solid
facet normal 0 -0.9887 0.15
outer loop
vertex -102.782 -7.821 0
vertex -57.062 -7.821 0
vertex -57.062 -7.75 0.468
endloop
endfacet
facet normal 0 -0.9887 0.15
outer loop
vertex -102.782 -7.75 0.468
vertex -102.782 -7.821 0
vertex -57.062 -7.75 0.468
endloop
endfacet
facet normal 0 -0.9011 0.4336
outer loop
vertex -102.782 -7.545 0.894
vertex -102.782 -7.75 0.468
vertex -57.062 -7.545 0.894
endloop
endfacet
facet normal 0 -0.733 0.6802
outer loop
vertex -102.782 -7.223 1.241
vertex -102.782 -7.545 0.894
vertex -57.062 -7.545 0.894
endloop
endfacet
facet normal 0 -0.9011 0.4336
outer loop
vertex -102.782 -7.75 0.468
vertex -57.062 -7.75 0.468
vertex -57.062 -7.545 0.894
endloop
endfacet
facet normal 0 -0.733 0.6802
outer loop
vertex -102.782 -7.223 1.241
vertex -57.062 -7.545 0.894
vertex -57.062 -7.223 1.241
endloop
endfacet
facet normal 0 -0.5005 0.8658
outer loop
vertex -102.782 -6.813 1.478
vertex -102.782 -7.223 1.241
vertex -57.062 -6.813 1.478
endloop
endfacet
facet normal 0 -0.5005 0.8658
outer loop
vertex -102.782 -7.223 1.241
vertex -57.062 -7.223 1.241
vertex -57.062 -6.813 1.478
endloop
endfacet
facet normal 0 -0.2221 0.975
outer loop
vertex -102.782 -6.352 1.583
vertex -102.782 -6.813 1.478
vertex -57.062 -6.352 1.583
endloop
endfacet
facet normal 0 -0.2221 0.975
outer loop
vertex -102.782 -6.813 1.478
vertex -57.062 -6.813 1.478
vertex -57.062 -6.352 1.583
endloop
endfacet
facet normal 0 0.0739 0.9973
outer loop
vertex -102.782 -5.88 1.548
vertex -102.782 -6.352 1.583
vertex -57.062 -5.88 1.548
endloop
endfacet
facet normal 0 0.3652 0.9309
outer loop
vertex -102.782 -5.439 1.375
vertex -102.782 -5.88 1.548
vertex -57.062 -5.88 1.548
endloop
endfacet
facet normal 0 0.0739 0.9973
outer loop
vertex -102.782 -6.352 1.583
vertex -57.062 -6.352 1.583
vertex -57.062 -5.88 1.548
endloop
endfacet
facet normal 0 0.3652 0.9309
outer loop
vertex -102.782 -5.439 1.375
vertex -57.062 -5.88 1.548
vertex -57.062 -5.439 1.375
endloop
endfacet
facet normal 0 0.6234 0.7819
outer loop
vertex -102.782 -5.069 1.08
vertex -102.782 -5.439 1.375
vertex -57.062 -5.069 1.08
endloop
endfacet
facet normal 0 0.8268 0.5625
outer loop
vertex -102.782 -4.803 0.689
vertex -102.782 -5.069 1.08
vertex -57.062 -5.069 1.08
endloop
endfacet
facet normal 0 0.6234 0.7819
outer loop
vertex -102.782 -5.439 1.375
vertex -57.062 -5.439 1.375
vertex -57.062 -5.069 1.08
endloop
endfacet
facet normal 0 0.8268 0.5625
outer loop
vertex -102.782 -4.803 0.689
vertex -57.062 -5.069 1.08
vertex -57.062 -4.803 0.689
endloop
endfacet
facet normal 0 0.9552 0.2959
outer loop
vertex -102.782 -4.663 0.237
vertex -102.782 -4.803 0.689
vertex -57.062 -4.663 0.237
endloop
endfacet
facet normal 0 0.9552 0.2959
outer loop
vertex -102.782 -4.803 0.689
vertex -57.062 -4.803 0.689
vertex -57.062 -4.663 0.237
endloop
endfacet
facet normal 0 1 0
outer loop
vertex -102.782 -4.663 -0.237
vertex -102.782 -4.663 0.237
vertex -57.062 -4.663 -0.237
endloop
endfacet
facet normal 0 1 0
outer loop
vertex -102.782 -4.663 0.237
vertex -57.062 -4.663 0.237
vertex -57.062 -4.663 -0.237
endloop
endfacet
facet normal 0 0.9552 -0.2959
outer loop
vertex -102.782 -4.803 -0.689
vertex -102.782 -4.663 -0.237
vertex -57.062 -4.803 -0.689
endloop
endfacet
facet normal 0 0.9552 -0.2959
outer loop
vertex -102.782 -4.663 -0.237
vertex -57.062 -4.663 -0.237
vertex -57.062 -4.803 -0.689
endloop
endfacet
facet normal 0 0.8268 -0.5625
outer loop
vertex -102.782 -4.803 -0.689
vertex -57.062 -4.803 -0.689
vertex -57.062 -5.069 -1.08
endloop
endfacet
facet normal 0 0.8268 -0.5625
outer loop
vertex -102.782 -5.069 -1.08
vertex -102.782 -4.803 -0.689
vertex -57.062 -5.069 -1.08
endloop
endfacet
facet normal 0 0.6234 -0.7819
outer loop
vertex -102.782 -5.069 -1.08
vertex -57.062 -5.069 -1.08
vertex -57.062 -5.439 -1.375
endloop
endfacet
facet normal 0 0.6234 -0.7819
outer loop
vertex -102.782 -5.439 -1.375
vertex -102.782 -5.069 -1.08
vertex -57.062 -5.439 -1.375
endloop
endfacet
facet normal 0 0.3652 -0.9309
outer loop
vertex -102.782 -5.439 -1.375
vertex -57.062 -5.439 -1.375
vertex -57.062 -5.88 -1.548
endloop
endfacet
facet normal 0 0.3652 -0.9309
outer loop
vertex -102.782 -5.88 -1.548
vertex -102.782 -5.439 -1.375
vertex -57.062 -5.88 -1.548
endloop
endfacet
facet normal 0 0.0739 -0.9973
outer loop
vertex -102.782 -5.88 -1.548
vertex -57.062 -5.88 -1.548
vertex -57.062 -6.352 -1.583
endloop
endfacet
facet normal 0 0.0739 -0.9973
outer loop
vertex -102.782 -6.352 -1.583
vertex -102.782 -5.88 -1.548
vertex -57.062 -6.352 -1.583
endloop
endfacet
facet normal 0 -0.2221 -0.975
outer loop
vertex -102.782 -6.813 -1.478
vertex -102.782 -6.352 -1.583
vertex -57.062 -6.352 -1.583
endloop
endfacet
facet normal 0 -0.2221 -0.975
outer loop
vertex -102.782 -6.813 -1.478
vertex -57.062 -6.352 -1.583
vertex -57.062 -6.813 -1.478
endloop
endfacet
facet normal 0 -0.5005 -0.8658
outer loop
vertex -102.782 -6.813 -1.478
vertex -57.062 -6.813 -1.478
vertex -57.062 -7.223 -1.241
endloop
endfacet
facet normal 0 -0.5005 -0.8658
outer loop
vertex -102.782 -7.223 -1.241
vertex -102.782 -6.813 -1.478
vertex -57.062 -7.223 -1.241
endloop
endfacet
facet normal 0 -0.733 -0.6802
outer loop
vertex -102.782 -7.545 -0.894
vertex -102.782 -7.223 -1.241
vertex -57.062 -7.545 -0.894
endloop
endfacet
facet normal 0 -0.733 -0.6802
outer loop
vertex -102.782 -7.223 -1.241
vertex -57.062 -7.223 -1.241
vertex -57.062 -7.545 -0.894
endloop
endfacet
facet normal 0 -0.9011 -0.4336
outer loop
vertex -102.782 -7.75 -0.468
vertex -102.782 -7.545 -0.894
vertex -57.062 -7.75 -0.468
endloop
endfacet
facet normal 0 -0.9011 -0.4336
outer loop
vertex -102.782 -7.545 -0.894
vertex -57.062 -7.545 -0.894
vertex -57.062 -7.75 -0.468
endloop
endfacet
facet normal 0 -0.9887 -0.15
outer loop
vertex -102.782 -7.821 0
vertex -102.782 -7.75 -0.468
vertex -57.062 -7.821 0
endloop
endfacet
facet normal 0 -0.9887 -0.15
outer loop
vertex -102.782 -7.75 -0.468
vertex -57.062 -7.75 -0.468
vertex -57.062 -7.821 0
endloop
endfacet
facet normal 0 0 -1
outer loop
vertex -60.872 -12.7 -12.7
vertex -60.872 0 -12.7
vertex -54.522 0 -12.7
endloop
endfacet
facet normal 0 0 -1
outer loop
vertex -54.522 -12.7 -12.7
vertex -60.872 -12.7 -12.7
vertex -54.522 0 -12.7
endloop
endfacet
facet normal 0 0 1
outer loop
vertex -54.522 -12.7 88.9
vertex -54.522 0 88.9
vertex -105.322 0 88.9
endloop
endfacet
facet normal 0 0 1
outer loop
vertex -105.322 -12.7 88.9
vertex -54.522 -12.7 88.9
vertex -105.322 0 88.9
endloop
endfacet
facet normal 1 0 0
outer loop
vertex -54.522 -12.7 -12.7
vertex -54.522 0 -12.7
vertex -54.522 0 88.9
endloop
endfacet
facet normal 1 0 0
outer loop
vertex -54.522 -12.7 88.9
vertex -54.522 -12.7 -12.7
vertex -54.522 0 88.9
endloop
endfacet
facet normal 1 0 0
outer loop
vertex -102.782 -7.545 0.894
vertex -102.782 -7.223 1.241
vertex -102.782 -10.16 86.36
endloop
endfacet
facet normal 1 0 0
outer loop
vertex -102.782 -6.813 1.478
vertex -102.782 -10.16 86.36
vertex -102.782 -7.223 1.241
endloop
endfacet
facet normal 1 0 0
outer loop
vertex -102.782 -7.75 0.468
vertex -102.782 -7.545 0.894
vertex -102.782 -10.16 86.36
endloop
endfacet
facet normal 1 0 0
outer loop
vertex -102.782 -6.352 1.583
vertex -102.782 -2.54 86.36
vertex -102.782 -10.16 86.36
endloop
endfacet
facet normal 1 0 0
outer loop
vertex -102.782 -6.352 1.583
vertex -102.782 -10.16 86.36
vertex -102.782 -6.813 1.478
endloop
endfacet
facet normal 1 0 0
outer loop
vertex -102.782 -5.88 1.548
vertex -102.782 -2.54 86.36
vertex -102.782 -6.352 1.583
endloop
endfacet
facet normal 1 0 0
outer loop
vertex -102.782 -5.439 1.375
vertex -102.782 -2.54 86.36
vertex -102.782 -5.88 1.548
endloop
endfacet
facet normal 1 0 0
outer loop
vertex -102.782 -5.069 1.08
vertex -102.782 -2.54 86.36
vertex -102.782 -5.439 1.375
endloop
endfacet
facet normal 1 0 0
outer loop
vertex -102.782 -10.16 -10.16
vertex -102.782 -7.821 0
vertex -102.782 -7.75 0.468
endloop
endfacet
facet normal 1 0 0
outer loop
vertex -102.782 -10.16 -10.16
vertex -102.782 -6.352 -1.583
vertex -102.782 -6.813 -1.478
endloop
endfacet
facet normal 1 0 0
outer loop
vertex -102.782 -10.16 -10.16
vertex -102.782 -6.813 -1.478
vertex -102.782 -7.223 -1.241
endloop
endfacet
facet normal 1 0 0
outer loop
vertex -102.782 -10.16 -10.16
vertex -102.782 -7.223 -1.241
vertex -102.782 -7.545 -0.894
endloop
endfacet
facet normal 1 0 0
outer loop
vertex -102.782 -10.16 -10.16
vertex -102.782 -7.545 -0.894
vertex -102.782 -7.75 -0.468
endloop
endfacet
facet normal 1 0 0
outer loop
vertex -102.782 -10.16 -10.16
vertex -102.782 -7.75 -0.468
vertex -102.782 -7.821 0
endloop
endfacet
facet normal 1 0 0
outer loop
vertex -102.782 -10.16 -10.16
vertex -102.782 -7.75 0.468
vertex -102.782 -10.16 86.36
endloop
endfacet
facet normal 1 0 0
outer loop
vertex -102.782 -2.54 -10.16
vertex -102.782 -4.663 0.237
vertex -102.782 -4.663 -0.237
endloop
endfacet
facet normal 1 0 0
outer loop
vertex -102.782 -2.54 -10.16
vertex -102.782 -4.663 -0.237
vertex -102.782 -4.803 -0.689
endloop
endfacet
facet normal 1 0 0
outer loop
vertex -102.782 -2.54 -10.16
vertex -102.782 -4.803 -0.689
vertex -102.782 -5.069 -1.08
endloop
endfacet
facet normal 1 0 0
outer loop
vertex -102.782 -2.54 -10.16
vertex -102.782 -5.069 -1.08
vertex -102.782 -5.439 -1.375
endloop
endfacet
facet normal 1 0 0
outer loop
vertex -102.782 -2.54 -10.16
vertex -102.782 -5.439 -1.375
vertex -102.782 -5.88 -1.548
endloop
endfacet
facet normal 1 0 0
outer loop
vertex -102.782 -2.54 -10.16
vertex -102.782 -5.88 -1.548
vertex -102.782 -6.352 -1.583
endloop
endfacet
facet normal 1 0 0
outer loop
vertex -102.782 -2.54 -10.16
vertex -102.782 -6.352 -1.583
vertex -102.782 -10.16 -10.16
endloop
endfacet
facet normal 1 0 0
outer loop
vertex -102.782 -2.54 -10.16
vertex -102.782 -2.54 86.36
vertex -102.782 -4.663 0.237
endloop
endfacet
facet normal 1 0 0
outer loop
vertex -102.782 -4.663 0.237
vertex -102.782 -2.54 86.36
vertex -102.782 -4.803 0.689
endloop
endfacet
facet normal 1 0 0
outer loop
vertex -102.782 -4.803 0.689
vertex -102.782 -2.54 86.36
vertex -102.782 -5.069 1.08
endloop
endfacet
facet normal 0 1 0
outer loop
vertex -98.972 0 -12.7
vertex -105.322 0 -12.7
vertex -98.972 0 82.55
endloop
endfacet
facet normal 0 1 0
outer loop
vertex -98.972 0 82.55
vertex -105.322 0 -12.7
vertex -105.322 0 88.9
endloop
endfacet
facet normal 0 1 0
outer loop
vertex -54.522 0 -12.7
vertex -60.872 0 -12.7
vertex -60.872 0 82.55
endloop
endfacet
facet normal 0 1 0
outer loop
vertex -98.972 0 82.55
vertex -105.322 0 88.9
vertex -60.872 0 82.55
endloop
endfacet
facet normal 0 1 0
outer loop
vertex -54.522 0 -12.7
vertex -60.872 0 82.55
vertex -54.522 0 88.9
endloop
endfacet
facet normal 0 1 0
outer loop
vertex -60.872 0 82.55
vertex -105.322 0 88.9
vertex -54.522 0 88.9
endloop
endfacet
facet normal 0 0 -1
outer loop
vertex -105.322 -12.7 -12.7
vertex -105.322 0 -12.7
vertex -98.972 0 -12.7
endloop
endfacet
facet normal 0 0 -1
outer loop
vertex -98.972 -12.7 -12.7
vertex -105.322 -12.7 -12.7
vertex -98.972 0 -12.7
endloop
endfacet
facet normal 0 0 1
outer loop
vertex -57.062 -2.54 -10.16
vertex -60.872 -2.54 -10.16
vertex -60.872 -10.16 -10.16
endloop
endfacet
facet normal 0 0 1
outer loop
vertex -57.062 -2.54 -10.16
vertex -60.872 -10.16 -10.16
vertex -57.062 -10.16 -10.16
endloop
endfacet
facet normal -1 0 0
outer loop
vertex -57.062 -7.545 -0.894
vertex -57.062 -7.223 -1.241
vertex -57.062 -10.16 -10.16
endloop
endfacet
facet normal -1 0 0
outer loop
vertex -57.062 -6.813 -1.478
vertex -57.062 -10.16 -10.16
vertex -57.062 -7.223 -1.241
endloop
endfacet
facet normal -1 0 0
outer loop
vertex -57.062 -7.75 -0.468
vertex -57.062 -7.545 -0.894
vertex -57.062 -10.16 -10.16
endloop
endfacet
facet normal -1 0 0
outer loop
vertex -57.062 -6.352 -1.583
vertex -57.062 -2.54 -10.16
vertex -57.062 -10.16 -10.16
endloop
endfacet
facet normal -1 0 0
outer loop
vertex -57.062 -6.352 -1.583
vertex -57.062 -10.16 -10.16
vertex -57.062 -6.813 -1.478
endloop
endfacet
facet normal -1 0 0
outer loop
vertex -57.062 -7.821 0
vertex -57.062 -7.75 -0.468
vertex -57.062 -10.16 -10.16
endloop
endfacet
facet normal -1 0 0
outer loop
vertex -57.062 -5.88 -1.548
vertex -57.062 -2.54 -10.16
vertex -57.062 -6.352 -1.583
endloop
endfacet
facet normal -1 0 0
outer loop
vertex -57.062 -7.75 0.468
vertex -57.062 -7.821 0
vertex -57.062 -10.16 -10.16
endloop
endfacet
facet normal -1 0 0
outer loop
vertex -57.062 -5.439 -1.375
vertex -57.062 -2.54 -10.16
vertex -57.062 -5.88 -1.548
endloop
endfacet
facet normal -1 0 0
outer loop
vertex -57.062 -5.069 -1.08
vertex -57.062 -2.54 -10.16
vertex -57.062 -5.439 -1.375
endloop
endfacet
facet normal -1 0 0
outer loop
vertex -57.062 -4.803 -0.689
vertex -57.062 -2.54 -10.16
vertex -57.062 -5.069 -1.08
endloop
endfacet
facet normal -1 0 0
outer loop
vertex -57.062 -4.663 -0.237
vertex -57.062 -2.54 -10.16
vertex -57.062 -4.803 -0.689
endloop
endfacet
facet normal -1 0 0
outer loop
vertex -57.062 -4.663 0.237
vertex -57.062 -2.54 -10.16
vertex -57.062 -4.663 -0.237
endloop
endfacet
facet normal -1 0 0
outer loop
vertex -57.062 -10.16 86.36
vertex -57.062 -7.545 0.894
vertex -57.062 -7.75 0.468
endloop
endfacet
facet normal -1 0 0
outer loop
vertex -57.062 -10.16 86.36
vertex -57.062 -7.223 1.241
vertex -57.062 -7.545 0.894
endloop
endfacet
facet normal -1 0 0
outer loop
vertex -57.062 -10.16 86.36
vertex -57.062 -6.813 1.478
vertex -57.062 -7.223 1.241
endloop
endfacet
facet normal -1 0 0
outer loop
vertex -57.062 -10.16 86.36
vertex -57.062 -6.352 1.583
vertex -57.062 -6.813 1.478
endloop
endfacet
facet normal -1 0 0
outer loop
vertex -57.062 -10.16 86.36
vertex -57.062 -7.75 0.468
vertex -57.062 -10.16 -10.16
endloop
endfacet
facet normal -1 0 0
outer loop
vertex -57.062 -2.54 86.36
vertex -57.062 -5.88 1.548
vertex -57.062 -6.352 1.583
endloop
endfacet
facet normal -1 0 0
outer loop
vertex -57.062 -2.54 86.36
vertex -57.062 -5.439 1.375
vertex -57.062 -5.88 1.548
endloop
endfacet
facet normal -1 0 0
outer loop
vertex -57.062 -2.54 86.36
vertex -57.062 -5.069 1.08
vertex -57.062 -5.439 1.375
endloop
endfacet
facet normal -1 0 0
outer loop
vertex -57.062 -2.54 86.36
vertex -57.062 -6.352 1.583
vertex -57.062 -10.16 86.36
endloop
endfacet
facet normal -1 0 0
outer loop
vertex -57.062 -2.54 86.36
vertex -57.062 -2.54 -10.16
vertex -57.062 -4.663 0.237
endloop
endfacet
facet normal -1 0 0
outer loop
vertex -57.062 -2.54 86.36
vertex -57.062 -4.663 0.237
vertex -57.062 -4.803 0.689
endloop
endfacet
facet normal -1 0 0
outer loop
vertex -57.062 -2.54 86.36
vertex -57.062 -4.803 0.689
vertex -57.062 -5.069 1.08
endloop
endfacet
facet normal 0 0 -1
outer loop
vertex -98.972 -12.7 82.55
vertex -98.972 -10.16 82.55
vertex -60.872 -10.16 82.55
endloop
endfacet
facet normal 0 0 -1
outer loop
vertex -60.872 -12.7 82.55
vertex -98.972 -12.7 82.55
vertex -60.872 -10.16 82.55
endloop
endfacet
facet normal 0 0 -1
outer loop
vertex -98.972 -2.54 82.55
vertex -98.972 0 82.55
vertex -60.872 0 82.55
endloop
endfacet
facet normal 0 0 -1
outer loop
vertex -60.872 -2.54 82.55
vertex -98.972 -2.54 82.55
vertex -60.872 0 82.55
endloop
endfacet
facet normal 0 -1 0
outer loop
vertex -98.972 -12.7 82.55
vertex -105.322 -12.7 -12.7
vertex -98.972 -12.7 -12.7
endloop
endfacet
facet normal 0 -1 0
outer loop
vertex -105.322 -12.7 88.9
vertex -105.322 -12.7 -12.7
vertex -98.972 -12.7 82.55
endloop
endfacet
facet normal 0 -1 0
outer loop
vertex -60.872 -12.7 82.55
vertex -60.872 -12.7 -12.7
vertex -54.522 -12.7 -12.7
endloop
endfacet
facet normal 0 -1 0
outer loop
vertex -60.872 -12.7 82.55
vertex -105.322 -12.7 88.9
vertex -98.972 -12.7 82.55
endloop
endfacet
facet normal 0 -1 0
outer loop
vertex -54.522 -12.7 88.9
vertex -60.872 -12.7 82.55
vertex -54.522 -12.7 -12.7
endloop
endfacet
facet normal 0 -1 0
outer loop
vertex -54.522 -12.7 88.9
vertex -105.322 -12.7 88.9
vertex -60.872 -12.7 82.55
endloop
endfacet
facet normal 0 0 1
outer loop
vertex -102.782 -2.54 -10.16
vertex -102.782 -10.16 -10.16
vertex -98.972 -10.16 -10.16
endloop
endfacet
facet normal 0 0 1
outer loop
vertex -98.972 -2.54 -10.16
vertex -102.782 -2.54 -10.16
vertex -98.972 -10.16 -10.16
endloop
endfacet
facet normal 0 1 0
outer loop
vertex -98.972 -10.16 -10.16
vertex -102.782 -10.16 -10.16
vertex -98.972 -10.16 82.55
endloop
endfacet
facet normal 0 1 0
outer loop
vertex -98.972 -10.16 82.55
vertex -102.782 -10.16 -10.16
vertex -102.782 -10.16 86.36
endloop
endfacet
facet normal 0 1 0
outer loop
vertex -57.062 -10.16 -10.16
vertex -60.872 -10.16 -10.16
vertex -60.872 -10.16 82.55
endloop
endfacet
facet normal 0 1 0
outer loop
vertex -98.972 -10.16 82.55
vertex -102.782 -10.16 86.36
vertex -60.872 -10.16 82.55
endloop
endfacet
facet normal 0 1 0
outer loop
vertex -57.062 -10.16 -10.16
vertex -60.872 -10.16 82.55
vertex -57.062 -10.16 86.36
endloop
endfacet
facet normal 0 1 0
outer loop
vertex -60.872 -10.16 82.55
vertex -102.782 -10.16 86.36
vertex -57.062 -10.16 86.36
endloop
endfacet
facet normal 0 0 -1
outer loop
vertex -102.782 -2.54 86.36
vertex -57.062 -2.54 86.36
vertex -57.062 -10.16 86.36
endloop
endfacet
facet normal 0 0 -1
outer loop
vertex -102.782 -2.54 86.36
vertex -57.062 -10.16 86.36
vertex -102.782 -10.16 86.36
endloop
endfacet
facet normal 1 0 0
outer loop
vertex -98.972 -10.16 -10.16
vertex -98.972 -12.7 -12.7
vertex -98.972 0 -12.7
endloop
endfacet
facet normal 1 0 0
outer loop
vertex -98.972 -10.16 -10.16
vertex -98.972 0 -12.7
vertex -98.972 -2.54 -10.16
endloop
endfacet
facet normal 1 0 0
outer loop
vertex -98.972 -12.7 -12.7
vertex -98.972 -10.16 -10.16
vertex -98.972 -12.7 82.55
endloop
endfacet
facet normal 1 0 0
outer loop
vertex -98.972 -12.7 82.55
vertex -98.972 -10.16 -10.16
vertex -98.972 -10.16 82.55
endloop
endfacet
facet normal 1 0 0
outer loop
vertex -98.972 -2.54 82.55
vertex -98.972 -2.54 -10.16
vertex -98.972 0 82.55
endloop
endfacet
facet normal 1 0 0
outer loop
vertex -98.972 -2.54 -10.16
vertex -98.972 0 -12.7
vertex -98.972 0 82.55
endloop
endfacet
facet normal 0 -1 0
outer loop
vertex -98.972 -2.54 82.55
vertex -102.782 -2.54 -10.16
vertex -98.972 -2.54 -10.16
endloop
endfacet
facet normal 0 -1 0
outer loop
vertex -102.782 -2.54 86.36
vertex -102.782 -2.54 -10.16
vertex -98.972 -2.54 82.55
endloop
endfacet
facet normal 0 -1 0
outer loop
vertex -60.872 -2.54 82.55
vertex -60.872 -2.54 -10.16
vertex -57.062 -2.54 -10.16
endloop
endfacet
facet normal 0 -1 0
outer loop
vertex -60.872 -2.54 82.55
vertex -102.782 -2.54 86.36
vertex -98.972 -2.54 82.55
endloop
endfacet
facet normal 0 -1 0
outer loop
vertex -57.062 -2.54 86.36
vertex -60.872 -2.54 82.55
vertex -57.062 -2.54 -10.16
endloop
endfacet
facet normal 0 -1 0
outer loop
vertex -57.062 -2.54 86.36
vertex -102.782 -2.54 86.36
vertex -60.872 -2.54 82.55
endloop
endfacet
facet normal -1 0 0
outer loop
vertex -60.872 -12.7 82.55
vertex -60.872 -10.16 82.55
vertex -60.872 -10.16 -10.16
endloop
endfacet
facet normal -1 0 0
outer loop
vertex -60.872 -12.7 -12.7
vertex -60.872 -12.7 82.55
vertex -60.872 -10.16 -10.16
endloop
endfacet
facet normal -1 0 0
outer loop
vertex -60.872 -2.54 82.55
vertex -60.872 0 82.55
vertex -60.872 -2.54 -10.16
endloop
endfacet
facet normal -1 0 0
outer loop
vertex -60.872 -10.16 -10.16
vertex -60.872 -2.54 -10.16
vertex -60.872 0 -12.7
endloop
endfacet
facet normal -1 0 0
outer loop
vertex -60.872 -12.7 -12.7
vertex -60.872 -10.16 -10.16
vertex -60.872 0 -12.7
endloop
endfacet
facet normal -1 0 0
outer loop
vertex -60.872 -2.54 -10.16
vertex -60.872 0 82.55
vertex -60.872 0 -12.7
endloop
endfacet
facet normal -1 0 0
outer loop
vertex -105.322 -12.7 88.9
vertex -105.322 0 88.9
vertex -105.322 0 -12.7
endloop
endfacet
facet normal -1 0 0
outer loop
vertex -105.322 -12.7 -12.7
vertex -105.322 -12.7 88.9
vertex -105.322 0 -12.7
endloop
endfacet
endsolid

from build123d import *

# Parameters (mm, degrees)
F1_DEPTH = 12.7
F2_T     = -2.54
F3_R     = 1.5875418941
F4_DEPTH = 45.72


# Not quite as in the source:
# - a feature names something its author has since deleted; it is built from what else it names


with BuildPart() as f1:
    # F0 (on Front) → F1 (new body)
    with BuildSketch(Plane.XZ):
        Polygon((-105.322439312, 88.9), (-105.322439312, -12.7), (-98.972439312, -12.7), (-98.972439312, 0), (-98.972439312, 82.55), (-60.872439312, 82.55), (-60.872439312, 0), (-60.872439312, -12.7), (-54.522439312, -12.7), (-54.522439312, 88.9), align=None)
    extrude(amount=F1_DEPTH)

    # F2
    f2_openings = [f1.faces().sort_by_distance(p)[0] for p in [
        (-60.872439, -6.35, 34.925),
        (-79.922439, -6.35, 82.55),
        (-98.972439, -6.35, 34.925),
    ]]
    offset(amount=F2_T, openings=f2_openings)

    # F3 (on face) → F4 (join)
    with BuildSketch(Plane(origin=(-57.062439312, 0, 0), x_dir=(0, -1, 0), z_dir=(-1, 0, 0))):
        with Locations((6.2330360524, 0)):
            Circle(F3_R)
    extrude(amount=F4_DEPTH)


solid = f1.part
